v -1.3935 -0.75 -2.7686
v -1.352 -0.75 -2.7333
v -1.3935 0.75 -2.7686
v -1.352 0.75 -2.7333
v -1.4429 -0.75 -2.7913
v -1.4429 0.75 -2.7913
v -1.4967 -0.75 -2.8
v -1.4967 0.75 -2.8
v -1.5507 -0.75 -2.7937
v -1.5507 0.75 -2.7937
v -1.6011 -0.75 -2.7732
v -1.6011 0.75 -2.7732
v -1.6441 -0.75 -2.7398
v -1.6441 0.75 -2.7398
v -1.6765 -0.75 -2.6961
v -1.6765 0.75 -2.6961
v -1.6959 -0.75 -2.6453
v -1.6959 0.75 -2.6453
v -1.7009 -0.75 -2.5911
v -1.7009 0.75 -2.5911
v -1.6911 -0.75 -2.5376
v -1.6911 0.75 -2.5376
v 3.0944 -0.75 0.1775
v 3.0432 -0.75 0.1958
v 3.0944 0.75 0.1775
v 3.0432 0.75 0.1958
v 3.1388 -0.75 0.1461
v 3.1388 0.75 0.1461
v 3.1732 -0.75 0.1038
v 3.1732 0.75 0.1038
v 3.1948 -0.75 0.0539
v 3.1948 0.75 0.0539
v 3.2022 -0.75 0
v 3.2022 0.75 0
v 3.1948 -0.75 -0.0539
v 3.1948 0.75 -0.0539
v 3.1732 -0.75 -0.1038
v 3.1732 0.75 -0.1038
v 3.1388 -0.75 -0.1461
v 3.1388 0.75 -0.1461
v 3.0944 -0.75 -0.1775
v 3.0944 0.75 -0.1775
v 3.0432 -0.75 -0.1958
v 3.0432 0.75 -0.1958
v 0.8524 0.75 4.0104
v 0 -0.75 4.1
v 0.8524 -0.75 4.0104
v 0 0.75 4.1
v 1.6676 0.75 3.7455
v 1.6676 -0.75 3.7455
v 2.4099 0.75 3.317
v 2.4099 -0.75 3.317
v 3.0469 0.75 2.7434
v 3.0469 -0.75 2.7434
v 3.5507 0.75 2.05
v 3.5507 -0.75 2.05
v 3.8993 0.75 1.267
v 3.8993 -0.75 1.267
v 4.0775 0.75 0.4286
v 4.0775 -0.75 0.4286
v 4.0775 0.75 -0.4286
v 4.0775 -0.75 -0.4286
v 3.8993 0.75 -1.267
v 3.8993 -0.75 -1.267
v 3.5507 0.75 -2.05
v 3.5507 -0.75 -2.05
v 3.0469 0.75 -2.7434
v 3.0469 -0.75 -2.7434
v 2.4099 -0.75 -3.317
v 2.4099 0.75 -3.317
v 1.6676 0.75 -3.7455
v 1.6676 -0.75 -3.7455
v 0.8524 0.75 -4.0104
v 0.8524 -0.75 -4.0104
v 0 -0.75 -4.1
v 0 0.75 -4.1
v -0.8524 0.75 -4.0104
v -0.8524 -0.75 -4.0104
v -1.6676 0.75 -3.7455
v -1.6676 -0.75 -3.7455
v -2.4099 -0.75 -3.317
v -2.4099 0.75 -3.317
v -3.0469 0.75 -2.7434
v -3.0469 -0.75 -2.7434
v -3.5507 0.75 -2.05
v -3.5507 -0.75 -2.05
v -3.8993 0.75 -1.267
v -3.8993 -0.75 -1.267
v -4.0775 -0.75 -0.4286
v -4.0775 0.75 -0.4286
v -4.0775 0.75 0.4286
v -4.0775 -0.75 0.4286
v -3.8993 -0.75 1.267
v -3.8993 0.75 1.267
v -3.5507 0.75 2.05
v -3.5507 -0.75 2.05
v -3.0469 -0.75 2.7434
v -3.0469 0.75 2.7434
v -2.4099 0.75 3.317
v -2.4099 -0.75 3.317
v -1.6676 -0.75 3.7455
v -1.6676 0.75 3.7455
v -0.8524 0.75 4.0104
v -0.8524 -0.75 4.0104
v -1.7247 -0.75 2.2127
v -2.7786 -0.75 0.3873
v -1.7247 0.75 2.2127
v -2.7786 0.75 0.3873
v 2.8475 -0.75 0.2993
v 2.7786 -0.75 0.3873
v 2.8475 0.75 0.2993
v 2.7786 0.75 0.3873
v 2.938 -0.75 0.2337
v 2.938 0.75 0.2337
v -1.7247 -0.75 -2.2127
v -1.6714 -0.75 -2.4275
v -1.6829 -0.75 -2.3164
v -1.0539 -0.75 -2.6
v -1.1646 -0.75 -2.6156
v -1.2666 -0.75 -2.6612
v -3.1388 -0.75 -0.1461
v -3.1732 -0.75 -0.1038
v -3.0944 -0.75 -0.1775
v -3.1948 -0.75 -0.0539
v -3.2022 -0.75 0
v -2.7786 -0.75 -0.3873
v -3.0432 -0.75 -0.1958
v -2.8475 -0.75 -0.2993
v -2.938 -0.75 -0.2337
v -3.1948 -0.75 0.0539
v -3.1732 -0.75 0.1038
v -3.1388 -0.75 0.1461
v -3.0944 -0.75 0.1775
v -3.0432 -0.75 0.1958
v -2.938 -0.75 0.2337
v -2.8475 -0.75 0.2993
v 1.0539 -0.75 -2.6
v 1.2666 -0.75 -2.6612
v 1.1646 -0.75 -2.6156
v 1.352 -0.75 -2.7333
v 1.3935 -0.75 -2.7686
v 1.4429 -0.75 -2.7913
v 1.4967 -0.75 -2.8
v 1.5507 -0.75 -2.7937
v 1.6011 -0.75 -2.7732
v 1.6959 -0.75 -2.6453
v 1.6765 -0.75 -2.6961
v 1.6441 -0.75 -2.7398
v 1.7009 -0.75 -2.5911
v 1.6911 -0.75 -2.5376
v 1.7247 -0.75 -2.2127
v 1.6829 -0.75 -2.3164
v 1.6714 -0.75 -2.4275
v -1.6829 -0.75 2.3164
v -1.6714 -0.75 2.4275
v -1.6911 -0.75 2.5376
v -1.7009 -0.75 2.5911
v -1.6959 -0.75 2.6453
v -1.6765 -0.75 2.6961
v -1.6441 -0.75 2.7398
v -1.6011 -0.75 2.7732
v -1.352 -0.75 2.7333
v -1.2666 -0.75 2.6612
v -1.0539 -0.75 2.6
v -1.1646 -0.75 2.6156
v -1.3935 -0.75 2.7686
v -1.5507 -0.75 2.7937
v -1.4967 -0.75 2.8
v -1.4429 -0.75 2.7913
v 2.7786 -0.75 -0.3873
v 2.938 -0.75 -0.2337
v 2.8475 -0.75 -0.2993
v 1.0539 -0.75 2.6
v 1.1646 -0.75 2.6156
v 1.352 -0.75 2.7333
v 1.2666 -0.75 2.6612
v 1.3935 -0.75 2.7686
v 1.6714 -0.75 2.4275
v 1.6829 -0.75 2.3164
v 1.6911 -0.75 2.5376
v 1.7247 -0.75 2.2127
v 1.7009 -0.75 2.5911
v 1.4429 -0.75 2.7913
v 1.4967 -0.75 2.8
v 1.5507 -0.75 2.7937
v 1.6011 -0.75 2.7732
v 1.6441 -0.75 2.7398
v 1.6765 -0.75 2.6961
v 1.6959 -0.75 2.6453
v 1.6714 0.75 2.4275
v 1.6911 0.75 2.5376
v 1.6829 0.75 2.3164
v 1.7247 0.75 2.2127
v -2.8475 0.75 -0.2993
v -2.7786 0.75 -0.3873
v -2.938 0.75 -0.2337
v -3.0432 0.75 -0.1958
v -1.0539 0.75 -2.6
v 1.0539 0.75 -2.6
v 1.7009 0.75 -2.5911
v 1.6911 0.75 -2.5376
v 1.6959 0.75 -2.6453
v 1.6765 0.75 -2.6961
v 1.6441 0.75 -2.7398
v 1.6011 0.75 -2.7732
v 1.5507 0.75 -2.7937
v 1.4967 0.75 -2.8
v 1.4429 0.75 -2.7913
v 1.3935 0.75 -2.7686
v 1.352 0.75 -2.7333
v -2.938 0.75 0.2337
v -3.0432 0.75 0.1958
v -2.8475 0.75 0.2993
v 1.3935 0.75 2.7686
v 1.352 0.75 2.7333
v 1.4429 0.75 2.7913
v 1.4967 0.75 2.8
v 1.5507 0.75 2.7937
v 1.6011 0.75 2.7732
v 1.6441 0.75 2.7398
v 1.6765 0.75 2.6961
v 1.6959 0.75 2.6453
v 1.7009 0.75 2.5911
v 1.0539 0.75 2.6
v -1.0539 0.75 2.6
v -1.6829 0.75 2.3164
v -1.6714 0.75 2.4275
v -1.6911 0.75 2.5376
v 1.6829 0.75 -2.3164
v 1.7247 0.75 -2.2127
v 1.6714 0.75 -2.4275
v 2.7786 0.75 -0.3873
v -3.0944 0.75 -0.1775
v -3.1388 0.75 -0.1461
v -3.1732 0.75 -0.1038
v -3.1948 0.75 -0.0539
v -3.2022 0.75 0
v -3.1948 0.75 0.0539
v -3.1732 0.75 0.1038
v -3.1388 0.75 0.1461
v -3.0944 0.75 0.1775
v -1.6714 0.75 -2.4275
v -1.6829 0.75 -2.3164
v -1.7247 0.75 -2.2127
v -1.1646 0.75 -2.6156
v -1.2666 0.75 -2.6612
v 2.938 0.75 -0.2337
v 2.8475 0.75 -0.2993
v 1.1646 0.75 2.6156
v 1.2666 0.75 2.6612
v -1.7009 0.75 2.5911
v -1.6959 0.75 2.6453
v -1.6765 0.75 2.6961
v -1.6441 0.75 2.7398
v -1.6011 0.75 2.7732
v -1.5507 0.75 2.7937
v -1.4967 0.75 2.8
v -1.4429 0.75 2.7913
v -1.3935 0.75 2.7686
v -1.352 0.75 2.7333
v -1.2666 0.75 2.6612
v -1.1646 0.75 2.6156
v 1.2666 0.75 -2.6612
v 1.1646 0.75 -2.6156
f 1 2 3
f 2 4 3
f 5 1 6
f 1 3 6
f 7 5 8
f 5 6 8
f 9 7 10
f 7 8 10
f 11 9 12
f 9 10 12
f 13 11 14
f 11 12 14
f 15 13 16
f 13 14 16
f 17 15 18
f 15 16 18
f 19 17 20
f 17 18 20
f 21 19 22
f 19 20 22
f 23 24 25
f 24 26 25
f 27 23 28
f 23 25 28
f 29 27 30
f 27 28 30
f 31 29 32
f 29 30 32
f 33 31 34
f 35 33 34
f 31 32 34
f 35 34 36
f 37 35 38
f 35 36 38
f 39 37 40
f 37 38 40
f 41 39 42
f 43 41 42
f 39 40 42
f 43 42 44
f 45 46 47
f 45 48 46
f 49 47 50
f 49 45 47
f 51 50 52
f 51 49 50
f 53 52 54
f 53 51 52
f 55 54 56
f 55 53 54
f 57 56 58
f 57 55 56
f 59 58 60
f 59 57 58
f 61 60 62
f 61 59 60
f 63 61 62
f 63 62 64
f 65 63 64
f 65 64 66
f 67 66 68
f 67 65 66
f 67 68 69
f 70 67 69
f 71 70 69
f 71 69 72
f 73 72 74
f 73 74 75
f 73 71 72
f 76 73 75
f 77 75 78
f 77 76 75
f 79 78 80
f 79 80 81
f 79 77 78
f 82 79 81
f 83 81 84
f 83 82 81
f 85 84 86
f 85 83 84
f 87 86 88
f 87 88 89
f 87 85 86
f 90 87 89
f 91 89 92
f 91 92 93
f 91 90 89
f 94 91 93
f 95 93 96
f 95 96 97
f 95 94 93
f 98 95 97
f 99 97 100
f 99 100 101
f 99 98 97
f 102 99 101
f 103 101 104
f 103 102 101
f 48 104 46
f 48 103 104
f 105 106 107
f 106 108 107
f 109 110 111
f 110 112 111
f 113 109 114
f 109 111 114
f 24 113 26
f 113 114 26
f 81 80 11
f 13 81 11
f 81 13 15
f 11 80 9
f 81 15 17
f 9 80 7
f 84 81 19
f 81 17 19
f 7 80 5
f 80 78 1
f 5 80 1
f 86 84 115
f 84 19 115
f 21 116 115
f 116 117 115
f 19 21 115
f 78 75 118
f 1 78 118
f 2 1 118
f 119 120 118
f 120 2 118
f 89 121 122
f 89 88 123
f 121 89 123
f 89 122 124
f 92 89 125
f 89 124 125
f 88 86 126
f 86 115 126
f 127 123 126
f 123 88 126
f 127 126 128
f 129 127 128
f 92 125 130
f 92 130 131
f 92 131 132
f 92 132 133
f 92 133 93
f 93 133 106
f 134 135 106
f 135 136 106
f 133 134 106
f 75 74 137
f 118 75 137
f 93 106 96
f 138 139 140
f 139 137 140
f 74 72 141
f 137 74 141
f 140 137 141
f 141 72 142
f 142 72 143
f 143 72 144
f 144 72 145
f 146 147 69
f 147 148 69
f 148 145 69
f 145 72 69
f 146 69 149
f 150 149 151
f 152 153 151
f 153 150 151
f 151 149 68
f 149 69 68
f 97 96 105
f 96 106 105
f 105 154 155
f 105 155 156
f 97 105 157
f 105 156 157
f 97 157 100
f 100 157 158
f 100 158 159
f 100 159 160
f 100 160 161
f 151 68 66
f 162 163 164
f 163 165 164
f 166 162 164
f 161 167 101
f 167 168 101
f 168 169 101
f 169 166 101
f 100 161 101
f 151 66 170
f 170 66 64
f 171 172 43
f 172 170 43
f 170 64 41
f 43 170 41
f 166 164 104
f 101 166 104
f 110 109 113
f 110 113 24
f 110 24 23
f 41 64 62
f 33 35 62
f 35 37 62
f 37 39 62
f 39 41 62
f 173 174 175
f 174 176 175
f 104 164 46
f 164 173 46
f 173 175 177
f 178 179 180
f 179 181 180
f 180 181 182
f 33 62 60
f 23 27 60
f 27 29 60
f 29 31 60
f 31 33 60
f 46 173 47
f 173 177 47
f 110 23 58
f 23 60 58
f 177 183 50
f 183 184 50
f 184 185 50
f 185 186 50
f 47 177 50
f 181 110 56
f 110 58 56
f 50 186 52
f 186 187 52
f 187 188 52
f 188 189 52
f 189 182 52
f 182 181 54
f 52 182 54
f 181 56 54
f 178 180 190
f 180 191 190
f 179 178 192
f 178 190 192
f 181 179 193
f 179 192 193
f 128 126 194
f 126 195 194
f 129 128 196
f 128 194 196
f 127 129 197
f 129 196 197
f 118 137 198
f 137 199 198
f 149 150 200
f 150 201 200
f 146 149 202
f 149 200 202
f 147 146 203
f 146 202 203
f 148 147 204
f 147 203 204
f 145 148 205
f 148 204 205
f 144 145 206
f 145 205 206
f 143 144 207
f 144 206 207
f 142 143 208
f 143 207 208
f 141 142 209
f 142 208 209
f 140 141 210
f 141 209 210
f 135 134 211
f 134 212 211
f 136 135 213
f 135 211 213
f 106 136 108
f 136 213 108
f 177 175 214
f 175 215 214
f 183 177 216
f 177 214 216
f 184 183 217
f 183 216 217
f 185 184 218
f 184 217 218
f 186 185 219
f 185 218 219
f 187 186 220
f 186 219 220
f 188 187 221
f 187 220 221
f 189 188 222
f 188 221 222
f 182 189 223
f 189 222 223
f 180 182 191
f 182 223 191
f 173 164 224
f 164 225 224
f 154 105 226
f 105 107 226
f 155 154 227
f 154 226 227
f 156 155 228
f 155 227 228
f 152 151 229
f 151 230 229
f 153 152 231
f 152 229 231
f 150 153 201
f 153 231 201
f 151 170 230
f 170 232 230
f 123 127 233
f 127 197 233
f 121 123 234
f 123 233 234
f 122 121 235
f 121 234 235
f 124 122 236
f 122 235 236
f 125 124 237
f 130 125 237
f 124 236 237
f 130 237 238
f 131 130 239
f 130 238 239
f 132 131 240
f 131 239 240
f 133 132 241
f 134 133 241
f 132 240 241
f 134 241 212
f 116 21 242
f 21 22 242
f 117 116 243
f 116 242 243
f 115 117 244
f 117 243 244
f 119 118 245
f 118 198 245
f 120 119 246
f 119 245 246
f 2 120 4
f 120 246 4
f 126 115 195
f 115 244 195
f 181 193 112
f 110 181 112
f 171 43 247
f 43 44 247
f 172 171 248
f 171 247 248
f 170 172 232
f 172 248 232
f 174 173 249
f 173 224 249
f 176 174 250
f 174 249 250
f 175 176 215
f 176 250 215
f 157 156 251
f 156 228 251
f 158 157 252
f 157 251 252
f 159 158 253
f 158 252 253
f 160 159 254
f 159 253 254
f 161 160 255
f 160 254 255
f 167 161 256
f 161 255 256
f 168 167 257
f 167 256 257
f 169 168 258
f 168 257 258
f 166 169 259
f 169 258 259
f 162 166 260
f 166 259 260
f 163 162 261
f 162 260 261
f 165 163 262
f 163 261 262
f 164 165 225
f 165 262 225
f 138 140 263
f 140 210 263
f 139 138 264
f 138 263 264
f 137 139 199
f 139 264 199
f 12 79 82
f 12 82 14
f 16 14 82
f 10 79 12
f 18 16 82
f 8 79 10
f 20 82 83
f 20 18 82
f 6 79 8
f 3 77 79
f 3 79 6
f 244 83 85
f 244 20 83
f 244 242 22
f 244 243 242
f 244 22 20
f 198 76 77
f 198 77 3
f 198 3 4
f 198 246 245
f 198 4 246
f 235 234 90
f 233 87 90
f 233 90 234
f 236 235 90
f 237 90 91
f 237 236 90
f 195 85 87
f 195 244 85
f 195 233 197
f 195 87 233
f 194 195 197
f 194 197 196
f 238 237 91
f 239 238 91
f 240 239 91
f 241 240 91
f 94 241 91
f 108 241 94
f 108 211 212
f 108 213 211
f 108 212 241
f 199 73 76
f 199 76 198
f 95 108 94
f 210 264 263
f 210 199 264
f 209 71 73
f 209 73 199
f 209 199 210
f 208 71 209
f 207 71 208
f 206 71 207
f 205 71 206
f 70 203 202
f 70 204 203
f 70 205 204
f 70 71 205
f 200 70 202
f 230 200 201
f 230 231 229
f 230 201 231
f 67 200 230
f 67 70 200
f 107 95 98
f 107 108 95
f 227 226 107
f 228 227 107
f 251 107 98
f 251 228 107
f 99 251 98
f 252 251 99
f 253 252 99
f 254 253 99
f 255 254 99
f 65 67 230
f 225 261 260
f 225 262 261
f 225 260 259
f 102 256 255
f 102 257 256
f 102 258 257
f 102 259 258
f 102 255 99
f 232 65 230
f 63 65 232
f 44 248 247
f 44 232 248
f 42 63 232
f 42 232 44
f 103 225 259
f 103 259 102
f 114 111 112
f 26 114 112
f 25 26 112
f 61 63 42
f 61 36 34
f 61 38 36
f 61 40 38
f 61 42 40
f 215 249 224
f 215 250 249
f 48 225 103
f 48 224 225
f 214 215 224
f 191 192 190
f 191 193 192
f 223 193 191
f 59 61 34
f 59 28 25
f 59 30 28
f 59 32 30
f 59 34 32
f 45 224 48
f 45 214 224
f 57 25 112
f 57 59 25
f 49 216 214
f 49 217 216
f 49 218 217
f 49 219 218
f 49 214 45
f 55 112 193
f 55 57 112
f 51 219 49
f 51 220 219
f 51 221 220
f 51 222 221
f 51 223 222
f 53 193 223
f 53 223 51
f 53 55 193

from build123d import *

# Parameters (mm, degrees)
CROQUIS1_R              = 4.1
SALIENTE_EXTRUIR1_DEPTH = 0.75


with BuildPart() as part:
    # Croquis1 → Saliente-Extruir1 (new, symmetric)
    with BuildSketch(Plane(origin=(0, 0, 0), x_dir=(1, 0, 0), z_dir=(0, 1, 0))):
        with Locations(Location((0, 0, 0), (0, 0, 270))):
            Circle(CROQUIS1_R)
        with BuildLine():
            Line((1.724717498, -2.212701665), (2.778614602, -0.387298335))
            ThreePointArc((2.778614602, -0.387298335), (2.890446656, -0.263302793), (3.043155854, -0.195766112))
            ThreePointArc((3.043155854, -0.195766112), (3.2022214, 0), (3.043155854, 0.195766112))
            ThreePointArc((3.043155854, 0.195766112), (2.890446656, 0.263302793), (2.778614602, 0.387298335))
            Line((2.778614602, 0.387298335), (1.724717498, 2.212701665))
            ThreePointArc((1.724717498, 2.212701665), (1.673250235, 2.371548836), (1.691116353, 2.537567222))
            ThreePointArc((1.691116353, 2.537567222), (1.6011107, 2.773205081), (1.352039501, 2.733333333))
            ThreePointArc((1.352039501, 2.733333333), (1.217196421, 2.634851628), (1.053897104, 2.6))
            Line((1.053897104, 2.6), (-1.053897104, 2.6))
            ThreePointArc((-1.053897104, 2.6), (-1.217196421, 2.634851628), (-1.352039501, 2.733333333))
            ThreePointArc((-1.352039501, 2.733333333), (-1.6011107, 2.773205081), (-1.691116353, 2.537567222))
            ThreePointArc((-1.691116353, 2.537567222), (-1.673250235, 2.371548836), (-1.724717498, 2.212701665))
            Line((-1.724717498, 2.212701665), (-2.778614602, 0.387298335))
            ThreePointArc((-2.778614602, 0.387298335), (-2.890446656, 0.263302793), (-3.043155854, 0.195766112))
            ThreePointArc((-3.043155854, 0.195766112), (-3.2022214, 0), (-3.043155854, -0.195766112))
            ThreePointArc((-3.043155854, -0.195766112), (-2.890446656, -0.263302793), (-2.778614602, -0.387298335))
            Line((-2.778614602, -0.387298335), (-1.724717498, -2.212701665))
            ThreePointArc((-1.724717498, -2.212701665), (-1.673250235, -2.371548836), (-1.691116353, -2.537567222))
            ThreePointArc((-1.691116353, -2.537567222), (-1.6011107, -2.773205081), (-1.352039501, -2.733333333))
            ThreePointArc((-1.352039501, -2.733333333), (-1.217196421, -2.634851628), (-1.053897104, -2.6))
            Line((-1.053897104, -2.6), (1.053897104, -2.6))
            ThreePointArc((1.053897104, -2.6), (1.217196421, -2.634851628), (1.352039501, -2.733333333))
            ThreePointArc((1.352039501, -2.733333333), (1.6011107, -2.773205081), (1.691116353, -2.537567222))
            ThreePointArc((1.691116353, -2.537567222), (1.673250235, -2.371548836), (1.724717498, -2.212701665))
        make_face(mode=Mode.SUBTRACT)
    extrude(amount=SALIENTE_EXTRUIR1_DEPTH, both=True)


solid = part.part
